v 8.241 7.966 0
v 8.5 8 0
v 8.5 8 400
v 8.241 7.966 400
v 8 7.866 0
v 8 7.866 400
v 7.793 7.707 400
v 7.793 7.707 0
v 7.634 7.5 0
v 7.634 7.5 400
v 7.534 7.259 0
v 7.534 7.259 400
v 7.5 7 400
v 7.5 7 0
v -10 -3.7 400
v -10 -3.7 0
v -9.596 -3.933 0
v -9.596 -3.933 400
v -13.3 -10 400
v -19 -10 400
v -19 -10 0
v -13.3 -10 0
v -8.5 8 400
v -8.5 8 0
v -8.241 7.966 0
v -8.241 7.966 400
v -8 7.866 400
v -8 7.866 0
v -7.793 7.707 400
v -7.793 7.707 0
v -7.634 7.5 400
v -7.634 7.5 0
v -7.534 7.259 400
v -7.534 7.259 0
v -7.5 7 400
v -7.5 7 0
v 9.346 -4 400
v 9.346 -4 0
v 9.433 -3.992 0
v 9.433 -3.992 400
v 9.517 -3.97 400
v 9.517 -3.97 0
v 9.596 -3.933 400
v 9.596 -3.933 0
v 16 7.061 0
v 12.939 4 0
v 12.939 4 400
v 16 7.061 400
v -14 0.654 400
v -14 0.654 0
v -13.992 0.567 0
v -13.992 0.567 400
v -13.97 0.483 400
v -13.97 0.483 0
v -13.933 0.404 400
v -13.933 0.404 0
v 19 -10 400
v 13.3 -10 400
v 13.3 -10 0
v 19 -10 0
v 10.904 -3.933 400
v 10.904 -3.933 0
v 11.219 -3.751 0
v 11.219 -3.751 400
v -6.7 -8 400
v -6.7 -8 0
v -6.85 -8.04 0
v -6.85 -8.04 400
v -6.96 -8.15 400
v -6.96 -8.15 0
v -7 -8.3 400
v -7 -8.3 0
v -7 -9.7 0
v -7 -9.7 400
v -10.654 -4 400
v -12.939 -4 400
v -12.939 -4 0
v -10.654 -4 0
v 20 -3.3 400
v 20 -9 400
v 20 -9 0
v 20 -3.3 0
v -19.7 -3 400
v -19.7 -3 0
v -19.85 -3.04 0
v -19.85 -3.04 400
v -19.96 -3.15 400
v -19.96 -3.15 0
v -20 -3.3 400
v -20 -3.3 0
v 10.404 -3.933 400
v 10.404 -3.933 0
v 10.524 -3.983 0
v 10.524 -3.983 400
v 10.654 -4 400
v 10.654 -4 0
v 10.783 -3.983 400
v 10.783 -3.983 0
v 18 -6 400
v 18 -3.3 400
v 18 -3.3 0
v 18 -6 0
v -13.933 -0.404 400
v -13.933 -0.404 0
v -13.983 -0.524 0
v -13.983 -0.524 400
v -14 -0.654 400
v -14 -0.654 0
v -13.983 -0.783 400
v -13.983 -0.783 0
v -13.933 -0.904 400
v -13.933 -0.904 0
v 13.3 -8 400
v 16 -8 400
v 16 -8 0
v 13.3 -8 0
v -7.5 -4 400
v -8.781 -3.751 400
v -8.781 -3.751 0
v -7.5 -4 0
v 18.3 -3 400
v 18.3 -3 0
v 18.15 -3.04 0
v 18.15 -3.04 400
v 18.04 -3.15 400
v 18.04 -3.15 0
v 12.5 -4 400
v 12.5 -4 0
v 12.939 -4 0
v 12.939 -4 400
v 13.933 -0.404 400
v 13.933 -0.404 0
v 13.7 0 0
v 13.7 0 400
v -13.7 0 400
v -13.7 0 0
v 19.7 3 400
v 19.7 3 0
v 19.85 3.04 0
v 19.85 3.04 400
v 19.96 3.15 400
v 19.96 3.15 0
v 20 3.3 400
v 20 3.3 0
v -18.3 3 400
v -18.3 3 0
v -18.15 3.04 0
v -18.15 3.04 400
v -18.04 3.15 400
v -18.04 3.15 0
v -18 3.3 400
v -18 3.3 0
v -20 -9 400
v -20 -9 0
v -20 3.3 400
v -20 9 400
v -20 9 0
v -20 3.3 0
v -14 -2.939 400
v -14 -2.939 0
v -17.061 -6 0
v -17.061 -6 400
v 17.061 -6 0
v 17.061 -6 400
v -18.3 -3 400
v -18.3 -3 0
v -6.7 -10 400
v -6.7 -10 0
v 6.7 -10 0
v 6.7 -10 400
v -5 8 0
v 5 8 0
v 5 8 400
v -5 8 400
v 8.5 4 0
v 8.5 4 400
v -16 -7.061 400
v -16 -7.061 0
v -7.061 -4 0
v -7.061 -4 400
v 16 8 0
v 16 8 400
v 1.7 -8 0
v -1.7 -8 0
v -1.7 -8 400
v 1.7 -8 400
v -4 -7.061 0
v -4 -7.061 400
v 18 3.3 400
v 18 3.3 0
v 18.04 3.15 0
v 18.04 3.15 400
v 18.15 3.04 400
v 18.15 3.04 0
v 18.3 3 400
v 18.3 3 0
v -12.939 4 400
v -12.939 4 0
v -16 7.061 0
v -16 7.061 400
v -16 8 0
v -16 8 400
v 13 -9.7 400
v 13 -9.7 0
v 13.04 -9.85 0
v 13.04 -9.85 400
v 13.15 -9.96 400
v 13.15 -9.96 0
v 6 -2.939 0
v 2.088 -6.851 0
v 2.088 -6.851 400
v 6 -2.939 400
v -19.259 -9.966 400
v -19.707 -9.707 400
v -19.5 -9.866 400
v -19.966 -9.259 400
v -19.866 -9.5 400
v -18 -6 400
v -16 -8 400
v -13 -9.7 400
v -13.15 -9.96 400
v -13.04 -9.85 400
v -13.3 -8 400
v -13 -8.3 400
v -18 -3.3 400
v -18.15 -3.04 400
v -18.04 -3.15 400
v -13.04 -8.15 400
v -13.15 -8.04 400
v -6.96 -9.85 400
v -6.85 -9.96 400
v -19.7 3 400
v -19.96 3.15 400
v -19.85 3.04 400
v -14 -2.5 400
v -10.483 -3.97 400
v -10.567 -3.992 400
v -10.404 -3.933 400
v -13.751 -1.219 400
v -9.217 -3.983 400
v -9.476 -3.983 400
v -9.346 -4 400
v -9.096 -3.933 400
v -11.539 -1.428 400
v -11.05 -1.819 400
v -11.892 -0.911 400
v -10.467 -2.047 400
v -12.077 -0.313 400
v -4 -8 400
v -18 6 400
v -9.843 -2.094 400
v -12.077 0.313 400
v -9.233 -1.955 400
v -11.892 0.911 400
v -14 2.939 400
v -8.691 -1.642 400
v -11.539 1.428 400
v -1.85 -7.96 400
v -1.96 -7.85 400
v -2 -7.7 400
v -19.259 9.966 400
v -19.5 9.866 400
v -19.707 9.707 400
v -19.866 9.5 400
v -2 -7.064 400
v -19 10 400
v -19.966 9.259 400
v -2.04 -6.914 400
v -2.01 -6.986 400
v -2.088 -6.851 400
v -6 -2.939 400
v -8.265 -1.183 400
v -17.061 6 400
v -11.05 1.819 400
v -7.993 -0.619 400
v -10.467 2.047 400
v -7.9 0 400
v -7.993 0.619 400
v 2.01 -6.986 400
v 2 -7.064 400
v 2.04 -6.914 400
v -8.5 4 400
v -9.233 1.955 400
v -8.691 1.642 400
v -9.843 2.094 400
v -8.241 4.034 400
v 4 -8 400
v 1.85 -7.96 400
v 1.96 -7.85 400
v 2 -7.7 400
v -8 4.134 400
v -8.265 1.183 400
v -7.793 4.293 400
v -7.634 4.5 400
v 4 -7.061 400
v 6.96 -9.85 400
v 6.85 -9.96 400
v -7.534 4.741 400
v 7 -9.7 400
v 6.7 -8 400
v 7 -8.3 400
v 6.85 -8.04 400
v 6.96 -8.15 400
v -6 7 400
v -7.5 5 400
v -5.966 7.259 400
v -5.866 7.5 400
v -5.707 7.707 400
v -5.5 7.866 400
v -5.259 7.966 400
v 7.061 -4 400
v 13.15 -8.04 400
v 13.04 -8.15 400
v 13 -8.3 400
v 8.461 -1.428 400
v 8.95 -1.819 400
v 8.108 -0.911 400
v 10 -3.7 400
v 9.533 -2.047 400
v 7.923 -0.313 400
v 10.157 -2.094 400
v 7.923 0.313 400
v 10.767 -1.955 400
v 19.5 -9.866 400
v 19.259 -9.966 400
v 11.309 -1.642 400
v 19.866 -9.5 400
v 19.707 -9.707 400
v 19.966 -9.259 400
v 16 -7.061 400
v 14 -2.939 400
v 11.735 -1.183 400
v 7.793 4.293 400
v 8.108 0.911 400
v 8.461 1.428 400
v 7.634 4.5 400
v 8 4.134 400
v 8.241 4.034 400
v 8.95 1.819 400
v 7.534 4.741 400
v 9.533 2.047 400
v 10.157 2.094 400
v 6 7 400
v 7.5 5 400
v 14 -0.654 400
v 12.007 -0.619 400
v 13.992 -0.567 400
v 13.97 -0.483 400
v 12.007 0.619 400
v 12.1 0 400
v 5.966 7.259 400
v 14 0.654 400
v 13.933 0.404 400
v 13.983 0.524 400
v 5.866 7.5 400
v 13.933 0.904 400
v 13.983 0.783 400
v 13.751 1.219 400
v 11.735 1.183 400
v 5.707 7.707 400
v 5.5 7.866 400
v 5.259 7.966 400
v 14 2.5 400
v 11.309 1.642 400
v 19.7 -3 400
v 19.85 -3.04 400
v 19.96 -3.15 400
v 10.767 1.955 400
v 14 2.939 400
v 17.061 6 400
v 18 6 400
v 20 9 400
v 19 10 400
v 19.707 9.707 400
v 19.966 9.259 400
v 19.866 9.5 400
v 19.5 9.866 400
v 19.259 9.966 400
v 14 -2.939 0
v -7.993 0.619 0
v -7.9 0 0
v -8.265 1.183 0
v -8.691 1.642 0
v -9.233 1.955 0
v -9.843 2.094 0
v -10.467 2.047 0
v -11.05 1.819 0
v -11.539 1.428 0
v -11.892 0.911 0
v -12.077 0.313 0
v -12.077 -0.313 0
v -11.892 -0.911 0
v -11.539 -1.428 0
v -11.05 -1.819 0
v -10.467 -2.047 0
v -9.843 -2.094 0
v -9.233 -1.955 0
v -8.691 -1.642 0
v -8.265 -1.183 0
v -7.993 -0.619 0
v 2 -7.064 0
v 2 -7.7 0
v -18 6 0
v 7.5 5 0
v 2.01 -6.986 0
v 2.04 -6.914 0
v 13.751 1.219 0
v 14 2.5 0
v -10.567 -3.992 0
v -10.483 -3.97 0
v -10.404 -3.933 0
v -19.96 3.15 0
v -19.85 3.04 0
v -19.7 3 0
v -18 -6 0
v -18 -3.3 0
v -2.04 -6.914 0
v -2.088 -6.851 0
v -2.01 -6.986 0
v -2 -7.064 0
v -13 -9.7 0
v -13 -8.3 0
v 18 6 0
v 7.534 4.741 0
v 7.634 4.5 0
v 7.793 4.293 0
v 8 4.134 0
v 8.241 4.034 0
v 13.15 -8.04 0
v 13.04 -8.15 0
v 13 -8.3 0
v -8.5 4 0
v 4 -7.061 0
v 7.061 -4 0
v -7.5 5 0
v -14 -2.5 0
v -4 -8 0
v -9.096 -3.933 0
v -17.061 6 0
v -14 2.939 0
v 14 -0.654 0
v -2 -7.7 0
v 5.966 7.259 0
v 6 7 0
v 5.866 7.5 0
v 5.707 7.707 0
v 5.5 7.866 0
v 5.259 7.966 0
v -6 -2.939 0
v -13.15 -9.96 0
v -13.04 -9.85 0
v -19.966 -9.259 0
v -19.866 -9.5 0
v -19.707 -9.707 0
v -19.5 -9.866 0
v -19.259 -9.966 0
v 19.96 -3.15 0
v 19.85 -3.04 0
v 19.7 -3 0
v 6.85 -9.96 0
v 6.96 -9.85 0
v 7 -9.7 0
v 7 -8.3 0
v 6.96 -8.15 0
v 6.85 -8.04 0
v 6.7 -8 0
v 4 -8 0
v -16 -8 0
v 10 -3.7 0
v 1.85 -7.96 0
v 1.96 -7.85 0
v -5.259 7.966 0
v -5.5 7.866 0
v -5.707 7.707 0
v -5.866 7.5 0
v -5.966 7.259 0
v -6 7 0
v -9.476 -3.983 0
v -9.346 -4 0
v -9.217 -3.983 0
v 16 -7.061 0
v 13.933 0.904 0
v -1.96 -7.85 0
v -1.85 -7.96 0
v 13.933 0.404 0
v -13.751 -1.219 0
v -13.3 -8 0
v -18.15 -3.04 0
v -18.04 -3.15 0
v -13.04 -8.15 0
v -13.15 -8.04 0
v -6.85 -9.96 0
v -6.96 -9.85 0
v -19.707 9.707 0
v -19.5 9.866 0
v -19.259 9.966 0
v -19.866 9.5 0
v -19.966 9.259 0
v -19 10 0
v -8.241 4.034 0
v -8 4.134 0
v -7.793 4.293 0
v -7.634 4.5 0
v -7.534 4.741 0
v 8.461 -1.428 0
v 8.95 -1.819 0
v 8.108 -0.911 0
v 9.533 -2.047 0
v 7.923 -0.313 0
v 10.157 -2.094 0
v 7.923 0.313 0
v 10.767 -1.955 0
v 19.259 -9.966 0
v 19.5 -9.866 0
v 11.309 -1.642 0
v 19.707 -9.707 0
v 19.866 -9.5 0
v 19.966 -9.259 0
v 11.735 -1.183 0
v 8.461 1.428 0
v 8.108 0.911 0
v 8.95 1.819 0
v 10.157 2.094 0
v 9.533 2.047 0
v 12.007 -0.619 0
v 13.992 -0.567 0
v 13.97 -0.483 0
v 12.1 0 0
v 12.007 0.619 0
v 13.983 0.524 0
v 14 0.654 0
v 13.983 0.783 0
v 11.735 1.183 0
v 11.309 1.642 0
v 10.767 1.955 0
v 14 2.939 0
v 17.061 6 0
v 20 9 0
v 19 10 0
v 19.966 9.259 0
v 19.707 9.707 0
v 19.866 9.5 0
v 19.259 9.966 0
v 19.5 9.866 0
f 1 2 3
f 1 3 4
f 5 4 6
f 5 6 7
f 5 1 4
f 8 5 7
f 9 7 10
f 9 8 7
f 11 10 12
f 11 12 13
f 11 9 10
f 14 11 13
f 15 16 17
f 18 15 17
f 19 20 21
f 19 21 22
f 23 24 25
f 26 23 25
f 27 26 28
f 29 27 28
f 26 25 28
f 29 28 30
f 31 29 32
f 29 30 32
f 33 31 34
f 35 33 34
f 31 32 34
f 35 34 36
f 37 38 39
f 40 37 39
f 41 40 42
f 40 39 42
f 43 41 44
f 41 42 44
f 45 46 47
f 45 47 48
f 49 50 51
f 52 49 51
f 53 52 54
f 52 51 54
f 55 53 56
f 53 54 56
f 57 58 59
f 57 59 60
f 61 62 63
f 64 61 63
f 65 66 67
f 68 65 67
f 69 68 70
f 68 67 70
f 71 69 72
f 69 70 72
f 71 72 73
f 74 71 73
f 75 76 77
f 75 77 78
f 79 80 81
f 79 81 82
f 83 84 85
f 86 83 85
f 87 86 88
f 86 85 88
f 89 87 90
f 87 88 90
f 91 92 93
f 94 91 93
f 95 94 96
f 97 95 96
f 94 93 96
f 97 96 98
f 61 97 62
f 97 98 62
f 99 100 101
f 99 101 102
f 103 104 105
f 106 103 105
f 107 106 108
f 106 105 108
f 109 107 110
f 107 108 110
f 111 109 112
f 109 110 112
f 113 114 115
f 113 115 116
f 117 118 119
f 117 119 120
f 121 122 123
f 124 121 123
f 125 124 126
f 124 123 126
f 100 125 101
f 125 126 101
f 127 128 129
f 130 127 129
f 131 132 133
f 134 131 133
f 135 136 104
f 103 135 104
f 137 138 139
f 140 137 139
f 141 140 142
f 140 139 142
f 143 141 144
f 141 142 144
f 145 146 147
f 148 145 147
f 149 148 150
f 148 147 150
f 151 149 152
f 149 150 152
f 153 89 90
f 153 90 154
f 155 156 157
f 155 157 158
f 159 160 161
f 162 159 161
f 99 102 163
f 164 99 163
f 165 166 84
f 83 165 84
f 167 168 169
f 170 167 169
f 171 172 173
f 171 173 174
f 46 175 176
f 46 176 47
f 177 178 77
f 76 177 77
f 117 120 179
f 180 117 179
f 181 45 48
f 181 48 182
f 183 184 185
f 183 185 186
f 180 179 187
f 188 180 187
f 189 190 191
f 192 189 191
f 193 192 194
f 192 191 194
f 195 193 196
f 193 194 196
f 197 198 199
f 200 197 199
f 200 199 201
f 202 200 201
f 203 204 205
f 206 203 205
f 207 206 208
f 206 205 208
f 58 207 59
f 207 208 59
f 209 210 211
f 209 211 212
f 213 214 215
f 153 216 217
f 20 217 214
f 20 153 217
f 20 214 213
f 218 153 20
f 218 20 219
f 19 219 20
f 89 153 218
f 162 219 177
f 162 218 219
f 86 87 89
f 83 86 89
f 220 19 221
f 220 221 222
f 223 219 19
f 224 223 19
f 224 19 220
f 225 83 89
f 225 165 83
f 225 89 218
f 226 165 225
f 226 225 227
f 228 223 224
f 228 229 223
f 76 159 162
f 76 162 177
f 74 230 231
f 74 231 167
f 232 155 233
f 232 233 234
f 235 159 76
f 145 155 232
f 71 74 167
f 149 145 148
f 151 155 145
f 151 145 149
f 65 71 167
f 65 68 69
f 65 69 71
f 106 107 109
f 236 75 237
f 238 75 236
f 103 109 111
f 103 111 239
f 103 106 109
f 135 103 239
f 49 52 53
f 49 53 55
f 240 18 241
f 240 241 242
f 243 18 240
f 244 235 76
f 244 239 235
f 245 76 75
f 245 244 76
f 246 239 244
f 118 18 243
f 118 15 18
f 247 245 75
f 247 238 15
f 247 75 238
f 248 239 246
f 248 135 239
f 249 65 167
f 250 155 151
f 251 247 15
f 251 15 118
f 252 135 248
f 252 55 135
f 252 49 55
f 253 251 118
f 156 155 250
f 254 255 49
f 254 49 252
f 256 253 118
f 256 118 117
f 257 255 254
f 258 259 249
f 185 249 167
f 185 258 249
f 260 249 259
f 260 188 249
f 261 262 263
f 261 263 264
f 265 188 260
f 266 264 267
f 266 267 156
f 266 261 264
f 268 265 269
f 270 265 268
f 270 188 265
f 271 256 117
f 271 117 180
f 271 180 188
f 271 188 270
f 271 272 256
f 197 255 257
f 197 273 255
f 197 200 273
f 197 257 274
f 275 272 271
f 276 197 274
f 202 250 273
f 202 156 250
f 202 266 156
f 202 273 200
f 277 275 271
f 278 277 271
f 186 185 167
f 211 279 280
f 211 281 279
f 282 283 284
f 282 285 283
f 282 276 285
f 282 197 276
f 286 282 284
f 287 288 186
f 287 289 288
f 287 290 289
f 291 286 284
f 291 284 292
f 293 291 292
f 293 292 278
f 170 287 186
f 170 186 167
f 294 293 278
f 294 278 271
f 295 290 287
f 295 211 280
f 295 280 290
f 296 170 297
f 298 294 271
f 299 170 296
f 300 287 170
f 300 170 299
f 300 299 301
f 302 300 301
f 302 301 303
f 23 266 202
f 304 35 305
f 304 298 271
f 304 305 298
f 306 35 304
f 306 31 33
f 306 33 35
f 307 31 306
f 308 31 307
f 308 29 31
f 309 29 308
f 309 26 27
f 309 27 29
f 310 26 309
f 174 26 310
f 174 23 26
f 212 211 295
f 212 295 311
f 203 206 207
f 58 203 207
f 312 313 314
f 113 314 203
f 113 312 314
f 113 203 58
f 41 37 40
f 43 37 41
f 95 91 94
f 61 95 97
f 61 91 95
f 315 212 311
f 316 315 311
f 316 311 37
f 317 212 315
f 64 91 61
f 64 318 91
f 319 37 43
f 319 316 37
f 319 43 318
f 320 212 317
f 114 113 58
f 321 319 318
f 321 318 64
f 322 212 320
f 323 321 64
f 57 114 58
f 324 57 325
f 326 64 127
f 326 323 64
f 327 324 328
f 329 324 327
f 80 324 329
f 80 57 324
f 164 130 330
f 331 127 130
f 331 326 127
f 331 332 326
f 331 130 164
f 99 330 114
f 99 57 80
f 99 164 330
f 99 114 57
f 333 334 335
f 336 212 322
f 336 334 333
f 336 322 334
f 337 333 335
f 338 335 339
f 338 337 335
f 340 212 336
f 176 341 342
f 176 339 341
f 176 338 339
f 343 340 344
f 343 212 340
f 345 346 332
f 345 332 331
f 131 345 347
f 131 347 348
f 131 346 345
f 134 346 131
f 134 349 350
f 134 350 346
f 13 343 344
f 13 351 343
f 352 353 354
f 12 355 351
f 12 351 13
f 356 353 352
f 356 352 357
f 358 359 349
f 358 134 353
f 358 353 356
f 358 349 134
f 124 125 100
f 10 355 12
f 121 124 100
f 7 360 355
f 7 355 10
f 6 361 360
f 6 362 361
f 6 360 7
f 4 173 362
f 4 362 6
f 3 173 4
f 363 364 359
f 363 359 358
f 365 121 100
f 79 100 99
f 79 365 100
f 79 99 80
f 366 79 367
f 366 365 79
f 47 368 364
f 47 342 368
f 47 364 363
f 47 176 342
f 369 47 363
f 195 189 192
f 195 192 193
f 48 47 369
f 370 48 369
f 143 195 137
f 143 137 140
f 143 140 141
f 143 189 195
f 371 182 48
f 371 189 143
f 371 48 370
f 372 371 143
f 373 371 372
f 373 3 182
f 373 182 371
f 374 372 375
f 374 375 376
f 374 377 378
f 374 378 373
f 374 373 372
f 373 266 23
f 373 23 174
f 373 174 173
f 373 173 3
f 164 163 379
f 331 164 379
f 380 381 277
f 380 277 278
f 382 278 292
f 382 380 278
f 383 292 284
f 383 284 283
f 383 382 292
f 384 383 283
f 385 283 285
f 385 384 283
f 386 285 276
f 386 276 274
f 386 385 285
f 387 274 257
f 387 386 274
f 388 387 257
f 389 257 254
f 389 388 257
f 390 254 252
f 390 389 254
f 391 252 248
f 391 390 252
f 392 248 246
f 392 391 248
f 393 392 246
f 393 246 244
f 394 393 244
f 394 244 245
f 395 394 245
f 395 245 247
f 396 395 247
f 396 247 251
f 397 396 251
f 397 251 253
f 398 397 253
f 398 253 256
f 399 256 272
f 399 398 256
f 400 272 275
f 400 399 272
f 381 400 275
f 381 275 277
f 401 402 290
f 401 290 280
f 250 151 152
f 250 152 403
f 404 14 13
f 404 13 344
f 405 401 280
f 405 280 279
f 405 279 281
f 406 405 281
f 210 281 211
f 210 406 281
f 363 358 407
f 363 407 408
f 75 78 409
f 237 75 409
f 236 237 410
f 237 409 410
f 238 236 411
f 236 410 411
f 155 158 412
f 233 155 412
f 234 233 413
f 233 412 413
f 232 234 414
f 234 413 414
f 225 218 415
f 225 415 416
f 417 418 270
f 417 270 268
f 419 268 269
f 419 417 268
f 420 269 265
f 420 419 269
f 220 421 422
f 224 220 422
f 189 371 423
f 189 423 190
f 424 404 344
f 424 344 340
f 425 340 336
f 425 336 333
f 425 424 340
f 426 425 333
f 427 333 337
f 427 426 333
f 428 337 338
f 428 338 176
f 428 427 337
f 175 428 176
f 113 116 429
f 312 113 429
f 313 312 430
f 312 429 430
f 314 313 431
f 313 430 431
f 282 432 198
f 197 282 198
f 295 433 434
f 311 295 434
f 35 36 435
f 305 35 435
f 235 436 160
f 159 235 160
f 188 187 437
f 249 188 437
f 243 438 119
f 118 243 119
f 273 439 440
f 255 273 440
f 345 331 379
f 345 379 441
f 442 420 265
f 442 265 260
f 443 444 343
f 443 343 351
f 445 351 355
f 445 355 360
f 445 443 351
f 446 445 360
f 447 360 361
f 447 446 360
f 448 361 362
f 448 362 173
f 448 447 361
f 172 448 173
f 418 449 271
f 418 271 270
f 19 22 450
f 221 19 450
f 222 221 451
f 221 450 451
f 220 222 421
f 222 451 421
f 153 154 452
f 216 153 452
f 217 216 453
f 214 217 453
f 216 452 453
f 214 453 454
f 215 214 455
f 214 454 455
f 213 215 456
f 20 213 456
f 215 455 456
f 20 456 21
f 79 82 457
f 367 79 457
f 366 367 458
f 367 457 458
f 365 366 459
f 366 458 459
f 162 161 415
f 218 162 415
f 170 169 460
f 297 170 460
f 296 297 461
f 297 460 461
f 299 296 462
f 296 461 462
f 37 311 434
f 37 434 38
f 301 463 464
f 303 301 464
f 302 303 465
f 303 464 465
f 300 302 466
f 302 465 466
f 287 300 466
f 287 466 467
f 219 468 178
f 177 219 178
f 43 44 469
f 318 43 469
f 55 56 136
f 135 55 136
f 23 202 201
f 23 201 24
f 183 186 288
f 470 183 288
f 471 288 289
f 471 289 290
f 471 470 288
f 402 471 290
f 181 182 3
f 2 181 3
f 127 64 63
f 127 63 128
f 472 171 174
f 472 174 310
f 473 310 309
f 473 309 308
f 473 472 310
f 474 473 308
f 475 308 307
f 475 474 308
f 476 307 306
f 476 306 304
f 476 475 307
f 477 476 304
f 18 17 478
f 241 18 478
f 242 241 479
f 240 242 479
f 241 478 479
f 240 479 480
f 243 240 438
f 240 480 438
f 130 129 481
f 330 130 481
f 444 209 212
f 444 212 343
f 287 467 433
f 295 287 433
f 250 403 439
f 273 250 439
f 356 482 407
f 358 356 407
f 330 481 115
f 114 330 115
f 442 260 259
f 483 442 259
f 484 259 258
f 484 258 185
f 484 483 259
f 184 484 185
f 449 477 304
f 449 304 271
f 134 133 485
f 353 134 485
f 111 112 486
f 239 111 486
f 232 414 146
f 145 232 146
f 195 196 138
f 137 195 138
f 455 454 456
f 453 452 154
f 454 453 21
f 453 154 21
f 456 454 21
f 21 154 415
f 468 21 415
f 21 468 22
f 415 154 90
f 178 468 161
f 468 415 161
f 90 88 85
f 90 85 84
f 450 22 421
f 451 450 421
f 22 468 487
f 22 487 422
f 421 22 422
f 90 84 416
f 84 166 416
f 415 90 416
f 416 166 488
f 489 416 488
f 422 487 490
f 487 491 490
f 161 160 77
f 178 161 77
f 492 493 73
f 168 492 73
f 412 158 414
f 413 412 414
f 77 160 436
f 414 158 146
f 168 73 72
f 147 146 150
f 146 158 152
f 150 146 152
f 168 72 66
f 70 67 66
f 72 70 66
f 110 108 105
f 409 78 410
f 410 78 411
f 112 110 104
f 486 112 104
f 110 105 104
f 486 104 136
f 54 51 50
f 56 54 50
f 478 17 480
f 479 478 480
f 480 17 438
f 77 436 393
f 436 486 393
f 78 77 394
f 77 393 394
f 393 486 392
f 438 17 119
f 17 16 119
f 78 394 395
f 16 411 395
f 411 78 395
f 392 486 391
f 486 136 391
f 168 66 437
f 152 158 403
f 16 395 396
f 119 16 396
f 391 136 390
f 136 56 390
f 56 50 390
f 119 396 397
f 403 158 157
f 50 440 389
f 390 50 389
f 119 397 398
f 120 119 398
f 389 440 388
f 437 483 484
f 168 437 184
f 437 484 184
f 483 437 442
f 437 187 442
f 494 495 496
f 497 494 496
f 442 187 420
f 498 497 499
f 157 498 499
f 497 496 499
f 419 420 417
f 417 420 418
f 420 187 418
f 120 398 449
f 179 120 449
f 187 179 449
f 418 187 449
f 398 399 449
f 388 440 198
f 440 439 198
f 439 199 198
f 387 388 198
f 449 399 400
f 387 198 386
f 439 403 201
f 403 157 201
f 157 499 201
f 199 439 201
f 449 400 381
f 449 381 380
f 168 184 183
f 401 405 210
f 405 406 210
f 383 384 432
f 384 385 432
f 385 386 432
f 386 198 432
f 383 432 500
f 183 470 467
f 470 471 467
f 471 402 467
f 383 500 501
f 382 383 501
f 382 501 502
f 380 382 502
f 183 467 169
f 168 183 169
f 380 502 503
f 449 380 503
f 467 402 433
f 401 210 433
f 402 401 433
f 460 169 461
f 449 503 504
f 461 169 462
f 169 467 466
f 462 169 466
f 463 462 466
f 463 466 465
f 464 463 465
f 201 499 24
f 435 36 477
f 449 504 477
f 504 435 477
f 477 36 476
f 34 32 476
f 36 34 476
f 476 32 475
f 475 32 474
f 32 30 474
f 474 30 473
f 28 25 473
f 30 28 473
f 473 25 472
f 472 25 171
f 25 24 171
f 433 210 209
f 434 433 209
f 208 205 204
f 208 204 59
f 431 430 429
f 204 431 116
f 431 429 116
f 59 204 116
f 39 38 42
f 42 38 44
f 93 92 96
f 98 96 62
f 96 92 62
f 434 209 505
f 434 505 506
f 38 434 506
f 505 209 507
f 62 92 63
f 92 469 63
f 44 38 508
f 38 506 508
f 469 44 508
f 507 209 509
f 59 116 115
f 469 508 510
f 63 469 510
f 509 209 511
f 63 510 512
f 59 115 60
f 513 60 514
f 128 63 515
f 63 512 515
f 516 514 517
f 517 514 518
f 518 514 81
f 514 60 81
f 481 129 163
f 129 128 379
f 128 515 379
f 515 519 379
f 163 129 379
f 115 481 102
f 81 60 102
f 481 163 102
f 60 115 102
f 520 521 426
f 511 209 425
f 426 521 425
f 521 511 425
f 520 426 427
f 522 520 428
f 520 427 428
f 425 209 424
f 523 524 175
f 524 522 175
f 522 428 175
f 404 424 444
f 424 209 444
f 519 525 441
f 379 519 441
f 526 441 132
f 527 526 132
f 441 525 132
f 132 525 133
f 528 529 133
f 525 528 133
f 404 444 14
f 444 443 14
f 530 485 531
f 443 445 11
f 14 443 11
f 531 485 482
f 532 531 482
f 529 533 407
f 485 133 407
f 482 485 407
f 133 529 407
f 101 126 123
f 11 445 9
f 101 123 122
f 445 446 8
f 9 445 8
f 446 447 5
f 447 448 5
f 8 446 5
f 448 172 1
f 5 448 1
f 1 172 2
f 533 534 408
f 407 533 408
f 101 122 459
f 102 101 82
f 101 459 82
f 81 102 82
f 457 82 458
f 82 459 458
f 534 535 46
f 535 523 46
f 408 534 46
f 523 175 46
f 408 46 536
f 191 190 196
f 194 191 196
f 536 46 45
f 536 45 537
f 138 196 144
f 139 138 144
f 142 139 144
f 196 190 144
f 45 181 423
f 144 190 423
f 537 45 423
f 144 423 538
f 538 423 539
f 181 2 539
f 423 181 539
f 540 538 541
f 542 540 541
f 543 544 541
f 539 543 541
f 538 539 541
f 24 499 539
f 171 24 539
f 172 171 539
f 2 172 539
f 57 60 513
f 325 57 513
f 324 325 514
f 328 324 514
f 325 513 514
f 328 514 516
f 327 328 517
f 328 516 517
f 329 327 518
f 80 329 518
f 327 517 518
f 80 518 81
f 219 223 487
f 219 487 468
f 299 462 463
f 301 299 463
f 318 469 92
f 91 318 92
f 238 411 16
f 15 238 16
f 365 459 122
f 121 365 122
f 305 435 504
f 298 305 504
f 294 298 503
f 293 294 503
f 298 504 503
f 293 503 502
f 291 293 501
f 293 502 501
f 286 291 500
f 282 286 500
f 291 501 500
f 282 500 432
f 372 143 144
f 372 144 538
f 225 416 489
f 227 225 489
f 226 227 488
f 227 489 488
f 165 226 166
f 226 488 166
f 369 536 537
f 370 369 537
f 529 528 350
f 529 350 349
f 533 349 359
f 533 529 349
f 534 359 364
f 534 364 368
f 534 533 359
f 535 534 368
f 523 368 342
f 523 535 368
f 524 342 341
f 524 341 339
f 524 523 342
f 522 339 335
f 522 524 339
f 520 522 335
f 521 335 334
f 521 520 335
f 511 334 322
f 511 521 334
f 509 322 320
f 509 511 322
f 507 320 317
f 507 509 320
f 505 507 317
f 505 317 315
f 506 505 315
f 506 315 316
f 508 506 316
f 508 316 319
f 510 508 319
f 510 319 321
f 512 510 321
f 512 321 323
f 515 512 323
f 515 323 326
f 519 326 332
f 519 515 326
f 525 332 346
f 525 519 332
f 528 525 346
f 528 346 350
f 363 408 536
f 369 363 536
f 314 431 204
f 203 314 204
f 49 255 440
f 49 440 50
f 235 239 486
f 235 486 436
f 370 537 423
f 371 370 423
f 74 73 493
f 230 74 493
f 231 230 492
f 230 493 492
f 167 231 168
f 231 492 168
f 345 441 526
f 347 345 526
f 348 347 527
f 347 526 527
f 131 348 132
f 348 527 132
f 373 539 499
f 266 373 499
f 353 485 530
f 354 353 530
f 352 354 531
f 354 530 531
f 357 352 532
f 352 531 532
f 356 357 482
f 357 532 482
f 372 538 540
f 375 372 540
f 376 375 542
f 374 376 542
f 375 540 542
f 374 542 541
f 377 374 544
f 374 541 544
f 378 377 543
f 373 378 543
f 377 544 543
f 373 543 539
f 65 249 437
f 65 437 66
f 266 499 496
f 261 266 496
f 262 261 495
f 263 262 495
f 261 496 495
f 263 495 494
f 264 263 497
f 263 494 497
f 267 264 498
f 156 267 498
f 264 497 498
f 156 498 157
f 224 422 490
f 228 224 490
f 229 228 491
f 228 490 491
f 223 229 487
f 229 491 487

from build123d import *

# Parameters (mm, degrees)
MODEL_R             = 2.1
BOSS_EXTRUDE1_DEPTH = 400


with BuildPart() as part:
    # Model → Boss-Extrude1 (new body)
    with BuildSketch(Plane.XY):
        with BuildLine():
            Line((19, 10), (-19, 10))
            ThreePointArc((-19, 10), (-19.707106781, 9.707106781), (-20, 9))
            Line((-20, 9), (-20, 3.3))
            ThreePointArc((-20, 3.3), (-19.912132034, 3.087867966), (-19.7, 3))
            Line((-19.7, 3), (-18.3, 3))
            ThreePointArc((-18.3, 3), (-18.087867966, 3.087867966), (-18, 3.3))
            Line((-18, 3.3), (-18, 6))
            Line((-18, 6), (-17.060660172, 6))
            Line((-17.060660172, 6), (-14, 2.939339828))
            Line((-14, 2.939339828), (-14, 0.653589838))
            ThreePointArc((-14, 0.653589838), (-13.982962913, 0.524180316), (-13.933012702, 0.403589838))
            Line((-13.933012702, 0.403589838), (-13.7, 0))
            Line((-13.7, 0), (-13.933012702, -0.403589838))
            ThreePointArc((-13.933012702, -0.403589838), (-14, -0.653589838), (-13.933012702, -0.903589838))
            Line((-13.933012702, -0.903589838), (-13.750976592, -1.218885629))
            Line((-13.750976592, -1.218885629), (-14, -2.5))
            Line((-14, -2.5), (-14, -2.939339828))
            Line((-14, -2.939339828), (-17.060660172, -6))
            Line((-17.060660172, -6), (-18, -6))
            Line((-18, -6), (-18, -3.3))
            ThreePointArc((-18, -3.3), (-18.087867966, -3.087867966), (-18.3, -3))
            Line((-18.3, -3), (-19.7, -3))
            ThreePointArc((-19.7, -3), (-19.912132034, -3.087867966), (-20, -3.3))
            Line((-20, -3.3), (-20, -9))
            ThreePointArc((-20, -9), (-19.707106781, -9.707106781), (-19, -10))
            Line((-19, -10), (-13.3, -10))
            ThreePointArc((-13.3, -10), (-13.087867966, -9.912132034), (-13, -9.7))
            Line((-13, -9.7), (-13, -8.3))
            ThreePointArc((-13, -8.3), (-13.087867966, -8.087867966), (-13.3, -8))
            Line((-13.3, -8), (-16, -8))
            Line((-16, -8), (-16, -7.060660172))
            Line((-16, -7.060660172), (-12.939339828, -4))
            Line((-12.939339828, -4), (-10.653589838, -4))
            ThreePointArc((-10.653589838, -4), (-10.524180316, -3.982962913), (-10.403589838, -3.933012702))
            Line((-10.403589838, -3.933012702), (-10, -3.7))
            Line((-10, -3.7), (-9.596410162, -3.933012702))
            ThreePointArc((-9.596410162, -3.933012702), (-9.346410162, -4), (-9.096410162, -3.933012702))
            Line((-9.096410162, -3.933012702), (-8.781114371, -3.750976592))
            Line((-8.781114371, -3.750976592), (-7.5, -4))
            Line((-7.5, -4), (-7.060660172, -4))
            Line((-7.060660172, -4), (-4, -7.060660172))
            Line((-4, -7.060660172), (-4, -8))
            Line((-4, -8), (-6.7, -8))
            ThreePointArc((-6.7, -8), (-6.912132034, -8.087867966), (-7, -8.3))
            Line((-7, -8.3), (-7, -9.7))
            ThreePointArc((-7, -9.7), (-6.912132034, -9.912132034), (-6.7, -10))
            Line((-6.7, -10), (6.7, -10))
            ThreePointArc((6.7, -10), (6.912132034, -9.912132034), (7, -9.7))
            Line((7, -9.7), (7, -8.3))
            ThreePointArc((7, -8.3), (6.912132034, -8.087867966), (6.7, -8))
            Line((6.7, -8), (4, -8))
            Line((4, -8), (4, -7.060660172))
            Line((4, -7.060660172), (7.060660172, -4))
            Line((7.060660172, -4), (9.346410162, -4))
            ThreePointArc((9.346410162, -4), (9.475819684, -3.982962913), (9.596410162, -3.933012702))
            Line((9.596410162, -3.933012702), (10, -3.7))
            Line((10, -3.7), (10.403589838, -3.933012702))
            ThreePointArc((10.403589838, -3.933012702), (10.653589838, -4), (10.903589838, -3.933012702))
            Line((10.903589838, -3.933012702), (11.218885629, -3.750976592))
            Line((11.218885629, -3.750976592), (12.5, -4))
            Line((12.5, -4), (12.939339828, -4))
            Line((12.939339828, -4), (16, -7.060660172))
            Line((16, -7.060660172), (16, -8))
            Line((16, -8), (13.3, -8))
            ThreePointArc((13.3, -8), (13.087867966, -8.087867966), (13, -8.3))
            Line((13, -8.3), (13, -9.7))
            ThreePointArc((13, -9.7), (13.087867966, -9.912132034), (13.3, -10))
            Line((13.3, -10), (19, -10))
            ThreePointArc((19, -10), (19.707106781, -9.707106781), (20, -9))
            Line((20, -9), (20, -3.3))
            ThreePointArc((20, -3.3), (19.912132034, -3.087867966), (19.7, -3))
            Line((19.7, -3), (18.3, -3))
            ThreePointArc((18.3, -3), (18.087867966, -3.087867966), (18, -3.3))
            Line((18, -3.3), (18, -6))
            Line((18, -6), (17.060660172, -6))
            Line((17.060660172, -6), (14, -2.939339828))
            Line((14, -2.939339828), (14, -0.653589838))
            ThreePointArc((14, -0.653589838), (13.982962913, -0.524180316), (13.933012702, -0.403589838))
            Line((13.933012702, -0.403589838), (13.7, 0))
            Line((13.7, 0), (13.933012702, 0.403589838))
            ThreePointArc((13.933012702, 0.403589838), (14, 0.653589838), (13.933012702, 0.903589838))
            Line((13.933012702, 0.903589838), (13.750976592, 1.218885629))
            Line((13.750976592, 1.218885629), (14, 2.5))
            Line((14, 2.5), (14, 2.939339828))
            Line((14, 2.939339828), (17.060660172, 6))
            Line((17.060660172, 6), (18, 6))
            Line((18, 6), (18, 3.3))
            ThreePointArc((18, 3.3), (18.087867966, 3.087867966), (18.3, 3))
            Line((18.3, 3), (19.7, 3))
            ThreePointArc((19.7, 3), (19.912132034, 3.087867966), (20, 3.3))
            Line((20, 3.3), (20, 9))
            ThreePointArc((20, 9), (19.707106781, 9.707106781), (19, 10))
        make_face()
        with Locations((-10, 0)):
            Circle(MODEL_R, mode=Mode.SUBTRACT)
        with Locations((10, 0)):
            Circle(MODEL_R, mode=Mode.SUBTRACT)
        with BuildLine():
            Line((-8.5, 4), (-12.939339828, 4))
            Line((-12.939339828, 4), (-16, 7.060660172))
            Line((-16, 7.060660172), (-16, 8))
            Line((-16, 8), (-8.5, 8))
            ThreePointArc((-8.5, 8), (-7.792893219, 7.707106781), (-7.5, 7))
            Line((-7.5, 7), (-7.5, 5))
            ThreePointArc((-7.5, 5), (-7.792893219, 4.292893219), (-8.5, 4))
        make_face(mode=Mode.SUBTRACT)
        with BuildLine():
            Line((8.5, 4), (12.939339828, 4))
            Line((12.939339828, 4), (16, 7.060660172))
            Line((16, 7.060660172), (16, 8))
            Line((16, 8), (8.5, 8))
            ThreePointArc((8.5, 8), (7.792893219, 7.707106781), (7.5, 7))
            Line((7.5, 7), (7.5, 5))
            ThreePointArc((7.5, 5), (7.792893219, 4.292893219), (8.5, 4))
        make_face(mode=Mode.SUBTRACT)
        with BuildLine():
            Line((-6, 7), (-6, -2.939339828))
            Line((-6, -2.939339828), (-2.087867966, -6.851471863))
            ThreePointArc((-2.087867966, -6.851471863), (-2.02283614, -6.948798867), (-2, -7.063603897))
            Line((-2, -7.063603897), (-2, -7.7))
            ThreePointArc((-2, -7.7), (-1.912132034, -7.912132034), (-1.7, -8))
            Line((-1.7, -8), (1.7, -8))
            ThreePointArc((1.7, -8), (1.912132034, -7.912132034), (2, -7.7))
            Line((2, -7.7), (2, -7.063603897))
            ThreePointArc((2, -7.063603897), (2.02283614, -6.948798867), (2.087867966, -6.851471863))
            Line((2.087867966, -6.851471863), (6, -2.939339828))
            Line((6, -2.939339828), (6, 7))
            ThreePointArc((6, 7), (5.707106781, 7.707106781), (5, 8))
            Line((5, 8), (-5, 8))
            ThreePointArc((-5, 8), (-5.707106781, 7.707106781), (-6, 7))
        make_face(mode=Mode.SUBTRACT)
    extrude(amount=BOSS_EXTRUDE1_DEPTH)


solid = part.part
